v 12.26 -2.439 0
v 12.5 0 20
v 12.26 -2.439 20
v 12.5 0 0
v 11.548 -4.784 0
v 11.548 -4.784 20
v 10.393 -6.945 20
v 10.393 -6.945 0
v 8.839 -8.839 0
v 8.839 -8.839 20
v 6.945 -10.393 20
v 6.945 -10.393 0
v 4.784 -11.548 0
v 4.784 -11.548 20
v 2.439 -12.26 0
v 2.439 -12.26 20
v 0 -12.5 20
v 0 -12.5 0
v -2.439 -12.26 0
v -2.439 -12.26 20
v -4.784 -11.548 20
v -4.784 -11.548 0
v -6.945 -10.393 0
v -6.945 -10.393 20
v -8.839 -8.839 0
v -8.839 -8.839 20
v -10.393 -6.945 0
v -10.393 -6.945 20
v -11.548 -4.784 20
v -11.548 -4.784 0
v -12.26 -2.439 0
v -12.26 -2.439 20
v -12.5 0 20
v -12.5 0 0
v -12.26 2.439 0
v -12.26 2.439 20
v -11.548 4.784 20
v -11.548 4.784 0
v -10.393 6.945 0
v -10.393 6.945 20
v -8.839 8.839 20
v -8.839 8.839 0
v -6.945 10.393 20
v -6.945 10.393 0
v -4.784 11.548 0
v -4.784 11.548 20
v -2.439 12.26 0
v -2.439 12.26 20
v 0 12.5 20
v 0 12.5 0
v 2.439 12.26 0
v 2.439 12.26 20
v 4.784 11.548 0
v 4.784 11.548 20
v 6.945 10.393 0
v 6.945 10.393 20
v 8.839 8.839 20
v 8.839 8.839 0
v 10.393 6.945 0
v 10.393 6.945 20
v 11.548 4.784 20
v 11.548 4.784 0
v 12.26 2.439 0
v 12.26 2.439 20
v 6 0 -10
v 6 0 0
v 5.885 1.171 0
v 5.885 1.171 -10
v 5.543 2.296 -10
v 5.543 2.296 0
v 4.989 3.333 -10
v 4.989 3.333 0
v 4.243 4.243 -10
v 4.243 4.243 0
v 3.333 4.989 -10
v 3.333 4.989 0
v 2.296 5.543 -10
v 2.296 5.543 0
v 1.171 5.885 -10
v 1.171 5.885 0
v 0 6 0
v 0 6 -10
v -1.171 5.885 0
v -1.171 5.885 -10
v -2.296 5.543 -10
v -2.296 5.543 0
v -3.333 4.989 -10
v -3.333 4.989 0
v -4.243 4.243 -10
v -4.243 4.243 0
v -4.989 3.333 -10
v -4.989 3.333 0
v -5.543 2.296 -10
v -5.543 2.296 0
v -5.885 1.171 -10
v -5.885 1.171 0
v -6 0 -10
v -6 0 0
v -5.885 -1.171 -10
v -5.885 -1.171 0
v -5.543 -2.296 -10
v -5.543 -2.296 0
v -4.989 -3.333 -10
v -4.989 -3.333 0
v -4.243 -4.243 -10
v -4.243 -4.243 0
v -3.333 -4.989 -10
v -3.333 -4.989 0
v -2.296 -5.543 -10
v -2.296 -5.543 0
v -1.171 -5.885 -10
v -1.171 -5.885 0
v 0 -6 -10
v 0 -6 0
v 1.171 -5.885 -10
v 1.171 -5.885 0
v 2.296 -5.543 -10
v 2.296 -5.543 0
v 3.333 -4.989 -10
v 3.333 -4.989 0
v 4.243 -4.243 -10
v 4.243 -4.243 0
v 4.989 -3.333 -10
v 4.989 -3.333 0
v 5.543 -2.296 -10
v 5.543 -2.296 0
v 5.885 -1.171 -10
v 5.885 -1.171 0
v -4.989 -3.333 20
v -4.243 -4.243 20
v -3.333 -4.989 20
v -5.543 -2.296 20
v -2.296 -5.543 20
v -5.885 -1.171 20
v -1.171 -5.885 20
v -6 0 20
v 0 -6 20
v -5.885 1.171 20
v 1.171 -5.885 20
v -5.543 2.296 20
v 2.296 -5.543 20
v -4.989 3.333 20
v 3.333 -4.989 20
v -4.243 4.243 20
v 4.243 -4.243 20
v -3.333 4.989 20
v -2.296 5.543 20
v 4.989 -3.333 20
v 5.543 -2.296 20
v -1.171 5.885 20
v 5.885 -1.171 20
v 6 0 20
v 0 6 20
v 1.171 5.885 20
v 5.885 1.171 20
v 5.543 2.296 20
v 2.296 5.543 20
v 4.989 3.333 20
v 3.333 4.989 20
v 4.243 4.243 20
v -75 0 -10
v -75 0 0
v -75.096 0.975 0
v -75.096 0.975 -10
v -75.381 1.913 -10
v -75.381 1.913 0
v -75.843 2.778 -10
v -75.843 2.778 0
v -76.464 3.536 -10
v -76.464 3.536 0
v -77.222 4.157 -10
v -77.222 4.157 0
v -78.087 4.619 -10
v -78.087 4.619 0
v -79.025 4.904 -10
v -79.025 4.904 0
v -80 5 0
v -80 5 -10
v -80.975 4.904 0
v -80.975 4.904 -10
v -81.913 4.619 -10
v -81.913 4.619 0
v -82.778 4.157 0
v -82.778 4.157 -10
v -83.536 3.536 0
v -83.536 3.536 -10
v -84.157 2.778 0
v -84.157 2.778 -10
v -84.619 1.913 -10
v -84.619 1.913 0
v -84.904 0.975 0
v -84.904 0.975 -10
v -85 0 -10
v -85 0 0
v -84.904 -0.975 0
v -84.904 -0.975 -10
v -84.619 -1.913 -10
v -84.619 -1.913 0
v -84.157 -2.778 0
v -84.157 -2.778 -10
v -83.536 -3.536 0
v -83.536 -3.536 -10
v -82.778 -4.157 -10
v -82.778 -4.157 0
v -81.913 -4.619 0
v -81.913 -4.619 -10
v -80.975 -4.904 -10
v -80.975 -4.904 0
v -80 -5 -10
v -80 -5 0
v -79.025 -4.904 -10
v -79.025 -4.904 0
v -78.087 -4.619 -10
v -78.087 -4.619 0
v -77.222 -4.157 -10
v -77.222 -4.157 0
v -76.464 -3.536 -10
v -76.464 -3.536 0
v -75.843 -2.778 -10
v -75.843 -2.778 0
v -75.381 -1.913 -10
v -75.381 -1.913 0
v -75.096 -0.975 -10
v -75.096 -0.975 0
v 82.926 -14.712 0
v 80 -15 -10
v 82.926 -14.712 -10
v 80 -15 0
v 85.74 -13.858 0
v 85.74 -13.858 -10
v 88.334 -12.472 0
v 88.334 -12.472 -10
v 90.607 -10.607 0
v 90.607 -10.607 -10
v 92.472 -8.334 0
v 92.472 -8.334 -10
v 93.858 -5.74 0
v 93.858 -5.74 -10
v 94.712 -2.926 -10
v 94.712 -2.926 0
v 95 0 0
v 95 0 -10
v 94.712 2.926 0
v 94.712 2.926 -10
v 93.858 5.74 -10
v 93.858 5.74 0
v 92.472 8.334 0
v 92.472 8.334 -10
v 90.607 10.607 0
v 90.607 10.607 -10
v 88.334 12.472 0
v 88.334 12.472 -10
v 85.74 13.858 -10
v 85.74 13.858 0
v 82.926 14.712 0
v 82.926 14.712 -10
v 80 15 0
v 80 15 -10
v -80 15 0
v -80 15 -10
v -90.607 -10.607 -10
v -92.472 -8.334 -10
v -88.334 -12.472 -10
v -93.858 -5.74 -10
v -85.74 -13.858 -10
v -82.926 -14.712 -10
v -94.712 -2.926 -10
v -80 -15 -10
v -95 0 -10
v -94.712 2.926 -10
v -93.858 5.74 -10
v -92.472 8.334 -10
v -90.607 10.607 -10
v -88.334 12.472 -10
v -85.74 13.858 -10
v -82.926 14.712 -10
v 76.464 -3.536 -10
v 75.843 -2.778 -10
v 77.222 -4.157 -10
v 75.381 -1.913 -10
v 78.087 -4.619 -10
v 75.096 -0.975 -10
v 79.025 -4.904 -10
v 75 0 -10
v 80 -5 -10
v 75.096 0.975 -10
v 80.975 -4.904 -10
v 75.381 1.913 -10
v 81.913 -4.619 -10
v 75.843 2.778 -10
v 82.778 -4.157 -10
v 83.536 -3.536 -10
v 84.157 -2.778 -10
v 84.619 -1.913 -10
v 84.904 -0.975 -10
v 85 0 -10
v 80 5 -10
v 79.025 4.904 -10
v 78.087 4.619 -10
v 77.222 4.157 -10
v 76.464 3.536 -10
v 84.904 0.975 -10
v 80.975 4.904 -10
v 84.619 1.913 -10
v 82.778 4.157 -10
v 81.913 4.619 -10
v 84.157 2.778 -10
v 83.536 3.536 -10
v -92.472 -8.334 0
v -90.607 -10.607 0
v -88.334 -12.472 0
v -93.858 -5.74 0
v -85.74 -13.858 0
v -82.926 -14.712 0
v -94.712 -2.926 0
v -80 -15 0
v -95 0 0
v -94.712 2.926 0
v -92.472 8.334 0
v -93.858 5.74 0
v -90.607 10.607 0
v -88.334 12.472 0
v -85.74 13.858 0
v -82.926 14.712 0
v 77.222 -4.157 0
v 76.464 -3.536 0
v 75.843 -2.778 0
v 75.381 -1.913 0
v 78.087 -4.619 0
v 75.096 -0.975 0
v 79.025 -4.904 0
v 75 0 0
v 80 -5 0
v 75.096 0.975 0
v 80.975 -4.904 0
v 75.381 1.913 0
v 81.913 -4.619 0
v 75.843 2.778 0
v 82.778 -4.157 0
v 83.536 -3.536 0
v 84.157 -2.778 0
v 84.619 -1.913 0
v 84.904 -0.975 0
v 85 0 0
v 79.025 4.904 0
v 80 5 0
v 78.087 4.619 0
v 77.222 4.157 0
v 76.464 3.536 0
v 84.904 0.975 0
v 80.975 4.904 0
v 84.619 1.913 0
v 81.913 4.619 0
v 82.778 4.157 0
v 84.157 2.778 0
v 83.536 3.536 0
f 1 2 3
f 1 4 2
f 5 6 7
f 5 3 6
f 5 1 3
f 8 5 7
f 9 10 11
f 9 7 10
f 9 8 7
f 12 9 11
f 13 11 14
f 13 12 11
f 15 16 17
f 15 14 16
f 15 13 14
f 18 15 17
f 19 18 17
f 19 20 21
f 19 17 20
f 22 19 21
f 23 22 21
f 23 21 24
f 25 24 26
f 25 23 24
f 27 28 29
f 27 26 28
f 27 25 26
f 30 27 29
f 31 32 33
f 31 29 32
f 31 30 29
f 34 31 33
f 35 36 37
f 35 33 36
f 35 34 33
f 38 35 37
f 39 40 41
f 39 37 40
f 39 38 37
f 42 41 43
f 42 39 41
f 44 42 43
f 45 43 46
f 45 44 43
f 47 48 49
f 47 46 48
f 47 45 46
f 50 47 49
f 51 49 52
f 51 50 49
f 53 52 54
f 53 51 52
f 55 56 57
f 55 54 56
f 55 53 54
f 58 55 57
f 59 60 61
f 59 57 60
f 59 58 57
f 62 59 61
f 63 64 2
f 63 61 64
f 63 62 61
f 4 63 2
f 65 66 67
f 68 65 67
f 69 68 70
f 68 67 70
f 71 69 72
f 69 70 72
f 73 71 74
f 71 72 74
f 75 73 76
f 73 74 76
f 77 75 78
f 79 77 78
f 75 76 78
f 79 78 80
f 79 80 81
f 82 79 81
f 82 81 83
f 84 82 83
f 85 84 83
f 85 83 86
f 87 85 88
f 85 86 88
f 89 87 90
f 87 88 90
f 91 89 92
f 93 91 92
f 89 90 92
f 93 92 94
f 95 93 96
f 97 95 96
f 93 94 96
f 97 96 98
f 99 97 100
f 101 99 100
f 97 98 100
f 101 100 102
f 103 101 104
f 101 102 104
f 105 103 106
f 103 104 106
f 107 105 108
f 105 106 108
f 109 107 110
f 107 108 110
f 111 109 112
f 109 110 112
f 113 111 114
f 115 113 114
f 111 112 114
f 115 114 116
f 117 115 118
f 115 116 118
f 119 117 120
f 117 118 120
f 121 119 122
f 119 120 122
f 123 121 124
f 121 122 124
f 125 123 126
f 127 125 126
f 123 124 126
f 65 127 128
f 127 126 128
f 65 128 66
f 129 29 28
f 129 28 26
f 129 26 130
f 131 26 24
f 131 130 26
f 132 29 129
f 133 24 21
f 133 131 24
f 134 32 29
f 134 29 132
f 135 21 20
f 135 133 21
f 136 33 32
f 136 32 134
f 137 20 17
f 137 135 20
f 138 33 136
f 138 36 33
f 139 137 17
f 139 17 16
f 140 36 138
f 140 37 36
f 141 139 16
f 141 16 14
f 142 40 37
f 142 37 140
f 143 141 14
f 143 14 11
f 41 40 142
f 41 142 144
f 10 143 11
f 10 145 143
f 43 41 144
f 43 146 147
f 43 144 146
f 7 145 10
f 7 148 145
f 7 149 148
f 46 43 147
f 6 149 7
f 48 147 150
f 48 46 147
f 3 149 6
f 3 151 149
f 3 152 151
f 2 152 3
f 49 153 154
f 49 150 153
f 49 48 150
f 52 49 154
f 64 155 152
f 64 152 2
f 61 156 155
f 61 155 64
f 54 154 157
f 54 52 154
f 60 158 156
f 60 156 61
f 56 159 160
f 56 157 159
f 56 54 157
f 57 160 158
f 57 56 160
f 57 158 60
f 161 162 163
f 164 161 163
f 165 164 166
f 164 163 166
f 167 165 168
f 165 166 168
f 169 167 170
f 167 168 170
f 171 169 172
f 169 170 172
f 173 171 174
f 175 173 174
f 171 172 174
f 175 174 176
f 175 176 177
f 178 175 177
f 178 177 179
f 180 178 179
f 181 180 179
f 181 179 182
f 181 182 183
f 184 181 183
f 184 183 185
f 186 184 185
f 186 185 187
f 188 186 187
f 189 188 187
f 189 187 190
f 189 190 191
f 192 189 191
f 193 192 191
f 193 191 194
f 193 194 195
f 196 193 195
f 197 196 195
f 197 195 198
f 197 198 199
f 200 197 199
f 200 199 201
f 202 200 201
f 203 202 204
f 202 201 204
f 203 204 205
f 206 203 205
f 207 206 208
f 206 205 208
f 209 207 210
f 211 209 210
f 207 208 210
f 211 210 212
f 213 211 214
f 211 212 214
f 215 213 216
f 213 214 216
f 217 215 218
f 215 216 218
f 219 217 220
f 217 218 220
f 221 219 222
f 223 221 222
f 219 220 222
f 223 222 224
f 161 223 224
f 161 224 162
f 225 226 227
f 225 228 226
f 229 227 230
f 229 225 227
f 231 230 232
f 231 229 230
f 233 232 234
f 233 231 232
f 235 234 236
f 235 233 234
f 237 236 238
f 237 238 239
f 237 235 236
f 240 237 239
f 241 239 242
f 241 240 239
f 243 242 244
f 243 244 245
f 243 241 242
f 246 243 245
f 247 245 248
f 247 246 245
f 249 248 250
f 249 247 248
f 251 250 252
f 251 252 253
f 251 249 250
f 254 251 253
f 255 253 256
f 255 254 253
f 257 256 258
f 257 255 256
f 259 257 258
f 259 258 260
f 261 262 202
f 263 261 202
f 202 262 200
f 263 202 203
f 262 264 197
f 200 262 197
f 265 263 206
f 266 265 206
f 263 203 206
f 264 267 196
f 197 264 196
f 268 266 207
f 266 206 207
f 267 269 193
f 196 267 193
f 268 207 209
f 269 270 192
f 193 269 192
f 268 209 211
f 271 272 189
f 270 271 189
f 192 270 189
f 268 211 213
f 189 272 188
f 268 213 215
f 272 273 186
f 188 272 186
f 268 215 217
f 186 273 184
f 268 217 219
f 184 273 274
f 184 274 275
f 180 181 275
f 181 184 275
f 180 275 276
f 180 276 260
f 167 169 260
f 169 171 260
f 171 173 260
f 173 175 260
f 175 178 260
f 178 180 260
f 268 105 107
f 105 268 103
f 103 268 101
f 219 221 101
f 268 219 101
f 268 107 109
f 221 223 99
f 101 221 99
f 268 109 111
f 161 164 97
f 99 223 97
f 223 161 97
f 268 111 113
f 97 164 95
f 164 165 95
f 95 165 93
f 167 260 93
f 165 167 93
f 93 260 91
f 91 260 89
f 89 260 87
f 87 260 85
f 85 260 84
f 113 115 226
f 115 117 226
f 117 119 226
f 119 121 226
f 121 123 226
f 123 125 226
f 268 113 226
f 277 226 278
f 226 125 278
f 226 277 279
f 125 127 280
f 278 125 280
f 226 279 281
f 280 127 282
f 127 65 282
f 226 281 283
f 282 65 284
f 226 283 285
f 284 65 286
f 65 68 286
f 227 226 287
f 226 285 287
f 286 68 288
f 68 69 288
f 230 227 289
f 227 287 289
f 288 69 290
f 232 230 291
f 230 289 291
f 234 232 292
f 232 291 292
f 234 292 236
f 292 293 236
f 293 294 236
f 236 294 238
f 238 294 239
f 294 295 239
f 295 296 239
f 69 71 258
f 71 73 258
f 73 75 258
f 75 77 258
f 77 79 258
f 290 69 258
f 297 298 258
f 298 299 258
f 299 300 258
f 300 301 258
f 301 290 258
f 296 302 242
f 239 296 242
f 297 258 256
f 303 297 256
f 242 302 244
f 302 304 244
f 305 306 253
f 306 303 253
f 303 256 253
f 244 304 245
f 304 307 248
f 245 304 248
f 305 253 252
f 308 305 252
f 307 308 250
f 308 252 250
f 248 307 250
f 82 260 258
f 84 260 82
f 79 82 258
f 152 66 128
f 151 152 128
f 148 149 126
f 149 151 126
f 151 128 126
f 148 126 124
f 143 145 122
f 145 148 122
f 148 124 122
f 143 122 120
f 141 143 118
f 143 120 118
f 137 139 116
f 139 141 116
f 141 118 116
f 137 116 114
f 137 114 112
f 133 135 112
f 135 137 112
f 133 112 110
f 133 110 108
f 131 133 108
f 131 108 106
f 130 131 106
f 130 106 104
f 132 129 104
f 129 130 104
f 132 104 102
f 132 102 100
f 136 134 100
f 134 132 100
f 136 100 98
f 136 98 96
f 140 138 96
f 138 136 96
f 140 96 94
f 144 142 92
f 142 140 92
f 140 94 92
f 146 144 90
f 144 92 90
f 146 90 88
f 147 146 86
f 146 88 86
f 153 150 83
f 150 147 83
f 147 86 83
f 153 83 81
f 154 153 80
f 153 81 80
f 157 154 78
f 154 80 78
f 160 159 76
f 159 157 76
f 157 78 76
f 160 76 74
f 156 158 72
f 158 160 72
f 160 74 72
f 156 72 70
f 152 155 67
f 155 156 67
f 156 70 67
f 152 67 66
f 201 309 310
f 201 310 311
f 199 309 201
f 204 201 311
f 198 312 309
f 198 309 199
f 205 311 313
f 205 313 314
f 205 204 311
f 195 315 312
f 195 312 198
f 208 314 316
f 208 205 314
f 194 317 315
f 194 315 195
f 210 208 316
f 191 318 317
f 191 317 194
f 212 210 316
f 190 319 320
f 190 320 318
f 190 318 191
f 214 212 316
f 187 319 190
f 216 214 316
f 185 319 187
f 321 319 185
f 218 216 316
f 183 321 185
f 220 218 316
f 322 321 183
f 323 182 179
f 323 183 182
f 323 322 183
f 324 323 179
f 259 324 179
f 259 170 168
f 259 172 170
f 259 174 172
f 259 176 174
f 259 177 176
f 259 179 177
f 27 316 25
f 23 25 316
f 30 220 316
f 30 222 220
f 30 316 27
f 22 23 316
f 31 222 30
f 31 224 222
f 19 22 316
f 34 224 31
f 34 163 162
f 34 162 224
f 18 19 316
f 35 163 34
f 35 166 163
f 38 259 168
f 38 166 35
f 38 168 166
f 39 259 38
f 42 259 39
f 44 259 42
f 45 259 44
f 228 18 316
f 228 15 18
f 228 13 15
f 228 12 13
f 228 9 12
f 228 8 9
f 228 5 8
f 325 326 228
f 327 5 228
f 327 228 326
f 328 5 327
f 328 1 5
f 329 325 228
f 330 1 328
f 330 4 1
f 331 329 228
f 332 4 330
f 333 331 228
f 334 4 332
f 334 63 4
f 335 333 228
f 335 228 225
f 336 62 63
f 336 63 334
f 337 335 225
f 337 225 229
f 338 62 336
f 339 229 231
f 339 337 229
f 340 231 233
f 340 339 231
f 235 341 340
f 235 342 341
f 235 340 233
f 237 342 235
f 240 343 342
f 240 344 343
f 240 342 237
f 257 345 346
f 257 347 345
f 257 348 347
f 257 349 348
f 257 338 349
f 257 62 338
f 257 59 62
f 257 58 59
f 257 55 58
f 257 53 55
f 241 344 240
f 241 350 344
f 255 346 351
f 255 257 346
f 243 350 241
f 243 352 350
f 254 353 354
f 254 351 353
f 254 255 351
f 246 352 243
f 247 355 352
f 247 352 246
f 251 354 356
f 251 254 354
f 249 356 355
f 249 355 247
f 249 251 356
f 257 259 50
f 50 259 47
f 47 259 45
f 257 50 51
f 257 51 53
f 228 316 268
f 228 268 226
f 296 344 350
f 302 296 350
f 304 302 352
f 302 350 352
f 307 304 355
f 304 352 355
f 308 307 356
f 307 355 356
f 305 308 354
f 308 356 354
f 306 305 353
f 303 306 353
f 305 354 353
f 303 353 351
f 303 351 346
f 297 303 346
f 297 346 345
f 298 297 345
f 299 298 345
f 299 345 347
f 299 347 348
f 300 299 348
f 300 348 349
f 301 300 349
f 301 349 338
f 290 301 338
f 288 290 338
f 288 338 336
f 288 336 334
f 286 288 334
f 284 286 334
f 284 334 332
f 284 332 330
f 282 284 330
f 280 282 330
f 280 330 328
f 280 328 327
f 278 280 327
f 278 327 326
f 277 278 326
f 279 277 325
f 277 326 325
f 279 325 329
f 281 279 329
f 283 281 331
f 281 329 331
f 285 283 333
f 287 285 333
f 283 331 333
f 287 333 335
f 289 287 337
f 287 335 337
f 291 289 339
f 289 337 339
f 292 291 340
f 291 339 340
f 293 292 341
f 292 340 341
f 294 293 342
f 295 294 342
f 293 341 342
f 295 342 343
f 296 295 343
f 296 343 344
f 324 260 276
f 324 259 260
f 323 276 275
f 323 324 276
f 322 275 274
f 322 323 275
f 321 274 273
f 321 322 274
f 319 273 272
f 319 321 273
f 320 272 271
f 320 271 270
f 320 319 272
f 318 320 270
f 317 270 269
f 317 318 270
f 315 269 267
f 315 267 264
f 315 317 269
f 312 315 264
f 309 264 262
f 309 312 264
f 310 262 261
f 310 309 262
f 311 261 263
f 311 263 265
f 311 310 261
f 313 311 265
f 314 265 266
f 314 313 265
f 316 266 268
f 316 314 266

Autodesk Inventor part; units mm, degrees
ref_plane "YZ Plane" through (0, 0, 0) normal (1, 0, 0) x (0, 1, 0)
ref_plane "XZ Plane" through (0, 0, 0) normal (0, 1, 0) x (-1, 0, 0)
ref_plane "XY Plane" through (0, 0, 0) normal (0, 0, 1) x (1, 0, 0)
sketch "Эскиз1" plane through (0, 0, 0) normal (0, 0, 1) x (1, 0, 0)
  line L0 (80, 0) -> (-80, 0) construction
  line L1 (80, 15) -> (-80, 15)
  line L2 (-80, -15) -> (80, -15)
  arc A0 (80, -15) -> (80, 15) centre (80, 0) ccw
  arc A1 (-80, 15) -> (-80, -15) centre (-80, 0) ccw
  circle A2 centre (0, 0) radius 12.5
  circle A3 centre (0, 0) radius 6
  circle A4 centre (-80, 0) radius 5
  circle A5 centre (80, 0) radius 5
  dimension "d0" = 80
  dimension "d1" = 30
  dimension "d4" = 25
  dimension "d5" = 12
  dimension "d6" = 10
  dimension "d7" = 10
extrude "Выдавливание1" add sketch "Эскиз1" against normal blind 10 contours A0 L2 A1 L1 | A2 | A3 | A4 | A5
extrude "Выдавливание2" cut sketch "Эскиз1" against normal blind 10 contours A5
extrude "Выдавливание3" cut sketch "Эскиз1" against normal blind 10 contours A4
extrude "Выдавливание4" add sketch "Эскиз1" along normal blind 20 contours A2
extrude "Выдавливание5" cut sketch "Эскиз1" along normal mid plane 2850 contours A3
equation "\"Глубина_просечки\" = 0.5 * Толщина"
equation "\"Толщина\" = 10"
properties part number "крышка" material "Сталь"
